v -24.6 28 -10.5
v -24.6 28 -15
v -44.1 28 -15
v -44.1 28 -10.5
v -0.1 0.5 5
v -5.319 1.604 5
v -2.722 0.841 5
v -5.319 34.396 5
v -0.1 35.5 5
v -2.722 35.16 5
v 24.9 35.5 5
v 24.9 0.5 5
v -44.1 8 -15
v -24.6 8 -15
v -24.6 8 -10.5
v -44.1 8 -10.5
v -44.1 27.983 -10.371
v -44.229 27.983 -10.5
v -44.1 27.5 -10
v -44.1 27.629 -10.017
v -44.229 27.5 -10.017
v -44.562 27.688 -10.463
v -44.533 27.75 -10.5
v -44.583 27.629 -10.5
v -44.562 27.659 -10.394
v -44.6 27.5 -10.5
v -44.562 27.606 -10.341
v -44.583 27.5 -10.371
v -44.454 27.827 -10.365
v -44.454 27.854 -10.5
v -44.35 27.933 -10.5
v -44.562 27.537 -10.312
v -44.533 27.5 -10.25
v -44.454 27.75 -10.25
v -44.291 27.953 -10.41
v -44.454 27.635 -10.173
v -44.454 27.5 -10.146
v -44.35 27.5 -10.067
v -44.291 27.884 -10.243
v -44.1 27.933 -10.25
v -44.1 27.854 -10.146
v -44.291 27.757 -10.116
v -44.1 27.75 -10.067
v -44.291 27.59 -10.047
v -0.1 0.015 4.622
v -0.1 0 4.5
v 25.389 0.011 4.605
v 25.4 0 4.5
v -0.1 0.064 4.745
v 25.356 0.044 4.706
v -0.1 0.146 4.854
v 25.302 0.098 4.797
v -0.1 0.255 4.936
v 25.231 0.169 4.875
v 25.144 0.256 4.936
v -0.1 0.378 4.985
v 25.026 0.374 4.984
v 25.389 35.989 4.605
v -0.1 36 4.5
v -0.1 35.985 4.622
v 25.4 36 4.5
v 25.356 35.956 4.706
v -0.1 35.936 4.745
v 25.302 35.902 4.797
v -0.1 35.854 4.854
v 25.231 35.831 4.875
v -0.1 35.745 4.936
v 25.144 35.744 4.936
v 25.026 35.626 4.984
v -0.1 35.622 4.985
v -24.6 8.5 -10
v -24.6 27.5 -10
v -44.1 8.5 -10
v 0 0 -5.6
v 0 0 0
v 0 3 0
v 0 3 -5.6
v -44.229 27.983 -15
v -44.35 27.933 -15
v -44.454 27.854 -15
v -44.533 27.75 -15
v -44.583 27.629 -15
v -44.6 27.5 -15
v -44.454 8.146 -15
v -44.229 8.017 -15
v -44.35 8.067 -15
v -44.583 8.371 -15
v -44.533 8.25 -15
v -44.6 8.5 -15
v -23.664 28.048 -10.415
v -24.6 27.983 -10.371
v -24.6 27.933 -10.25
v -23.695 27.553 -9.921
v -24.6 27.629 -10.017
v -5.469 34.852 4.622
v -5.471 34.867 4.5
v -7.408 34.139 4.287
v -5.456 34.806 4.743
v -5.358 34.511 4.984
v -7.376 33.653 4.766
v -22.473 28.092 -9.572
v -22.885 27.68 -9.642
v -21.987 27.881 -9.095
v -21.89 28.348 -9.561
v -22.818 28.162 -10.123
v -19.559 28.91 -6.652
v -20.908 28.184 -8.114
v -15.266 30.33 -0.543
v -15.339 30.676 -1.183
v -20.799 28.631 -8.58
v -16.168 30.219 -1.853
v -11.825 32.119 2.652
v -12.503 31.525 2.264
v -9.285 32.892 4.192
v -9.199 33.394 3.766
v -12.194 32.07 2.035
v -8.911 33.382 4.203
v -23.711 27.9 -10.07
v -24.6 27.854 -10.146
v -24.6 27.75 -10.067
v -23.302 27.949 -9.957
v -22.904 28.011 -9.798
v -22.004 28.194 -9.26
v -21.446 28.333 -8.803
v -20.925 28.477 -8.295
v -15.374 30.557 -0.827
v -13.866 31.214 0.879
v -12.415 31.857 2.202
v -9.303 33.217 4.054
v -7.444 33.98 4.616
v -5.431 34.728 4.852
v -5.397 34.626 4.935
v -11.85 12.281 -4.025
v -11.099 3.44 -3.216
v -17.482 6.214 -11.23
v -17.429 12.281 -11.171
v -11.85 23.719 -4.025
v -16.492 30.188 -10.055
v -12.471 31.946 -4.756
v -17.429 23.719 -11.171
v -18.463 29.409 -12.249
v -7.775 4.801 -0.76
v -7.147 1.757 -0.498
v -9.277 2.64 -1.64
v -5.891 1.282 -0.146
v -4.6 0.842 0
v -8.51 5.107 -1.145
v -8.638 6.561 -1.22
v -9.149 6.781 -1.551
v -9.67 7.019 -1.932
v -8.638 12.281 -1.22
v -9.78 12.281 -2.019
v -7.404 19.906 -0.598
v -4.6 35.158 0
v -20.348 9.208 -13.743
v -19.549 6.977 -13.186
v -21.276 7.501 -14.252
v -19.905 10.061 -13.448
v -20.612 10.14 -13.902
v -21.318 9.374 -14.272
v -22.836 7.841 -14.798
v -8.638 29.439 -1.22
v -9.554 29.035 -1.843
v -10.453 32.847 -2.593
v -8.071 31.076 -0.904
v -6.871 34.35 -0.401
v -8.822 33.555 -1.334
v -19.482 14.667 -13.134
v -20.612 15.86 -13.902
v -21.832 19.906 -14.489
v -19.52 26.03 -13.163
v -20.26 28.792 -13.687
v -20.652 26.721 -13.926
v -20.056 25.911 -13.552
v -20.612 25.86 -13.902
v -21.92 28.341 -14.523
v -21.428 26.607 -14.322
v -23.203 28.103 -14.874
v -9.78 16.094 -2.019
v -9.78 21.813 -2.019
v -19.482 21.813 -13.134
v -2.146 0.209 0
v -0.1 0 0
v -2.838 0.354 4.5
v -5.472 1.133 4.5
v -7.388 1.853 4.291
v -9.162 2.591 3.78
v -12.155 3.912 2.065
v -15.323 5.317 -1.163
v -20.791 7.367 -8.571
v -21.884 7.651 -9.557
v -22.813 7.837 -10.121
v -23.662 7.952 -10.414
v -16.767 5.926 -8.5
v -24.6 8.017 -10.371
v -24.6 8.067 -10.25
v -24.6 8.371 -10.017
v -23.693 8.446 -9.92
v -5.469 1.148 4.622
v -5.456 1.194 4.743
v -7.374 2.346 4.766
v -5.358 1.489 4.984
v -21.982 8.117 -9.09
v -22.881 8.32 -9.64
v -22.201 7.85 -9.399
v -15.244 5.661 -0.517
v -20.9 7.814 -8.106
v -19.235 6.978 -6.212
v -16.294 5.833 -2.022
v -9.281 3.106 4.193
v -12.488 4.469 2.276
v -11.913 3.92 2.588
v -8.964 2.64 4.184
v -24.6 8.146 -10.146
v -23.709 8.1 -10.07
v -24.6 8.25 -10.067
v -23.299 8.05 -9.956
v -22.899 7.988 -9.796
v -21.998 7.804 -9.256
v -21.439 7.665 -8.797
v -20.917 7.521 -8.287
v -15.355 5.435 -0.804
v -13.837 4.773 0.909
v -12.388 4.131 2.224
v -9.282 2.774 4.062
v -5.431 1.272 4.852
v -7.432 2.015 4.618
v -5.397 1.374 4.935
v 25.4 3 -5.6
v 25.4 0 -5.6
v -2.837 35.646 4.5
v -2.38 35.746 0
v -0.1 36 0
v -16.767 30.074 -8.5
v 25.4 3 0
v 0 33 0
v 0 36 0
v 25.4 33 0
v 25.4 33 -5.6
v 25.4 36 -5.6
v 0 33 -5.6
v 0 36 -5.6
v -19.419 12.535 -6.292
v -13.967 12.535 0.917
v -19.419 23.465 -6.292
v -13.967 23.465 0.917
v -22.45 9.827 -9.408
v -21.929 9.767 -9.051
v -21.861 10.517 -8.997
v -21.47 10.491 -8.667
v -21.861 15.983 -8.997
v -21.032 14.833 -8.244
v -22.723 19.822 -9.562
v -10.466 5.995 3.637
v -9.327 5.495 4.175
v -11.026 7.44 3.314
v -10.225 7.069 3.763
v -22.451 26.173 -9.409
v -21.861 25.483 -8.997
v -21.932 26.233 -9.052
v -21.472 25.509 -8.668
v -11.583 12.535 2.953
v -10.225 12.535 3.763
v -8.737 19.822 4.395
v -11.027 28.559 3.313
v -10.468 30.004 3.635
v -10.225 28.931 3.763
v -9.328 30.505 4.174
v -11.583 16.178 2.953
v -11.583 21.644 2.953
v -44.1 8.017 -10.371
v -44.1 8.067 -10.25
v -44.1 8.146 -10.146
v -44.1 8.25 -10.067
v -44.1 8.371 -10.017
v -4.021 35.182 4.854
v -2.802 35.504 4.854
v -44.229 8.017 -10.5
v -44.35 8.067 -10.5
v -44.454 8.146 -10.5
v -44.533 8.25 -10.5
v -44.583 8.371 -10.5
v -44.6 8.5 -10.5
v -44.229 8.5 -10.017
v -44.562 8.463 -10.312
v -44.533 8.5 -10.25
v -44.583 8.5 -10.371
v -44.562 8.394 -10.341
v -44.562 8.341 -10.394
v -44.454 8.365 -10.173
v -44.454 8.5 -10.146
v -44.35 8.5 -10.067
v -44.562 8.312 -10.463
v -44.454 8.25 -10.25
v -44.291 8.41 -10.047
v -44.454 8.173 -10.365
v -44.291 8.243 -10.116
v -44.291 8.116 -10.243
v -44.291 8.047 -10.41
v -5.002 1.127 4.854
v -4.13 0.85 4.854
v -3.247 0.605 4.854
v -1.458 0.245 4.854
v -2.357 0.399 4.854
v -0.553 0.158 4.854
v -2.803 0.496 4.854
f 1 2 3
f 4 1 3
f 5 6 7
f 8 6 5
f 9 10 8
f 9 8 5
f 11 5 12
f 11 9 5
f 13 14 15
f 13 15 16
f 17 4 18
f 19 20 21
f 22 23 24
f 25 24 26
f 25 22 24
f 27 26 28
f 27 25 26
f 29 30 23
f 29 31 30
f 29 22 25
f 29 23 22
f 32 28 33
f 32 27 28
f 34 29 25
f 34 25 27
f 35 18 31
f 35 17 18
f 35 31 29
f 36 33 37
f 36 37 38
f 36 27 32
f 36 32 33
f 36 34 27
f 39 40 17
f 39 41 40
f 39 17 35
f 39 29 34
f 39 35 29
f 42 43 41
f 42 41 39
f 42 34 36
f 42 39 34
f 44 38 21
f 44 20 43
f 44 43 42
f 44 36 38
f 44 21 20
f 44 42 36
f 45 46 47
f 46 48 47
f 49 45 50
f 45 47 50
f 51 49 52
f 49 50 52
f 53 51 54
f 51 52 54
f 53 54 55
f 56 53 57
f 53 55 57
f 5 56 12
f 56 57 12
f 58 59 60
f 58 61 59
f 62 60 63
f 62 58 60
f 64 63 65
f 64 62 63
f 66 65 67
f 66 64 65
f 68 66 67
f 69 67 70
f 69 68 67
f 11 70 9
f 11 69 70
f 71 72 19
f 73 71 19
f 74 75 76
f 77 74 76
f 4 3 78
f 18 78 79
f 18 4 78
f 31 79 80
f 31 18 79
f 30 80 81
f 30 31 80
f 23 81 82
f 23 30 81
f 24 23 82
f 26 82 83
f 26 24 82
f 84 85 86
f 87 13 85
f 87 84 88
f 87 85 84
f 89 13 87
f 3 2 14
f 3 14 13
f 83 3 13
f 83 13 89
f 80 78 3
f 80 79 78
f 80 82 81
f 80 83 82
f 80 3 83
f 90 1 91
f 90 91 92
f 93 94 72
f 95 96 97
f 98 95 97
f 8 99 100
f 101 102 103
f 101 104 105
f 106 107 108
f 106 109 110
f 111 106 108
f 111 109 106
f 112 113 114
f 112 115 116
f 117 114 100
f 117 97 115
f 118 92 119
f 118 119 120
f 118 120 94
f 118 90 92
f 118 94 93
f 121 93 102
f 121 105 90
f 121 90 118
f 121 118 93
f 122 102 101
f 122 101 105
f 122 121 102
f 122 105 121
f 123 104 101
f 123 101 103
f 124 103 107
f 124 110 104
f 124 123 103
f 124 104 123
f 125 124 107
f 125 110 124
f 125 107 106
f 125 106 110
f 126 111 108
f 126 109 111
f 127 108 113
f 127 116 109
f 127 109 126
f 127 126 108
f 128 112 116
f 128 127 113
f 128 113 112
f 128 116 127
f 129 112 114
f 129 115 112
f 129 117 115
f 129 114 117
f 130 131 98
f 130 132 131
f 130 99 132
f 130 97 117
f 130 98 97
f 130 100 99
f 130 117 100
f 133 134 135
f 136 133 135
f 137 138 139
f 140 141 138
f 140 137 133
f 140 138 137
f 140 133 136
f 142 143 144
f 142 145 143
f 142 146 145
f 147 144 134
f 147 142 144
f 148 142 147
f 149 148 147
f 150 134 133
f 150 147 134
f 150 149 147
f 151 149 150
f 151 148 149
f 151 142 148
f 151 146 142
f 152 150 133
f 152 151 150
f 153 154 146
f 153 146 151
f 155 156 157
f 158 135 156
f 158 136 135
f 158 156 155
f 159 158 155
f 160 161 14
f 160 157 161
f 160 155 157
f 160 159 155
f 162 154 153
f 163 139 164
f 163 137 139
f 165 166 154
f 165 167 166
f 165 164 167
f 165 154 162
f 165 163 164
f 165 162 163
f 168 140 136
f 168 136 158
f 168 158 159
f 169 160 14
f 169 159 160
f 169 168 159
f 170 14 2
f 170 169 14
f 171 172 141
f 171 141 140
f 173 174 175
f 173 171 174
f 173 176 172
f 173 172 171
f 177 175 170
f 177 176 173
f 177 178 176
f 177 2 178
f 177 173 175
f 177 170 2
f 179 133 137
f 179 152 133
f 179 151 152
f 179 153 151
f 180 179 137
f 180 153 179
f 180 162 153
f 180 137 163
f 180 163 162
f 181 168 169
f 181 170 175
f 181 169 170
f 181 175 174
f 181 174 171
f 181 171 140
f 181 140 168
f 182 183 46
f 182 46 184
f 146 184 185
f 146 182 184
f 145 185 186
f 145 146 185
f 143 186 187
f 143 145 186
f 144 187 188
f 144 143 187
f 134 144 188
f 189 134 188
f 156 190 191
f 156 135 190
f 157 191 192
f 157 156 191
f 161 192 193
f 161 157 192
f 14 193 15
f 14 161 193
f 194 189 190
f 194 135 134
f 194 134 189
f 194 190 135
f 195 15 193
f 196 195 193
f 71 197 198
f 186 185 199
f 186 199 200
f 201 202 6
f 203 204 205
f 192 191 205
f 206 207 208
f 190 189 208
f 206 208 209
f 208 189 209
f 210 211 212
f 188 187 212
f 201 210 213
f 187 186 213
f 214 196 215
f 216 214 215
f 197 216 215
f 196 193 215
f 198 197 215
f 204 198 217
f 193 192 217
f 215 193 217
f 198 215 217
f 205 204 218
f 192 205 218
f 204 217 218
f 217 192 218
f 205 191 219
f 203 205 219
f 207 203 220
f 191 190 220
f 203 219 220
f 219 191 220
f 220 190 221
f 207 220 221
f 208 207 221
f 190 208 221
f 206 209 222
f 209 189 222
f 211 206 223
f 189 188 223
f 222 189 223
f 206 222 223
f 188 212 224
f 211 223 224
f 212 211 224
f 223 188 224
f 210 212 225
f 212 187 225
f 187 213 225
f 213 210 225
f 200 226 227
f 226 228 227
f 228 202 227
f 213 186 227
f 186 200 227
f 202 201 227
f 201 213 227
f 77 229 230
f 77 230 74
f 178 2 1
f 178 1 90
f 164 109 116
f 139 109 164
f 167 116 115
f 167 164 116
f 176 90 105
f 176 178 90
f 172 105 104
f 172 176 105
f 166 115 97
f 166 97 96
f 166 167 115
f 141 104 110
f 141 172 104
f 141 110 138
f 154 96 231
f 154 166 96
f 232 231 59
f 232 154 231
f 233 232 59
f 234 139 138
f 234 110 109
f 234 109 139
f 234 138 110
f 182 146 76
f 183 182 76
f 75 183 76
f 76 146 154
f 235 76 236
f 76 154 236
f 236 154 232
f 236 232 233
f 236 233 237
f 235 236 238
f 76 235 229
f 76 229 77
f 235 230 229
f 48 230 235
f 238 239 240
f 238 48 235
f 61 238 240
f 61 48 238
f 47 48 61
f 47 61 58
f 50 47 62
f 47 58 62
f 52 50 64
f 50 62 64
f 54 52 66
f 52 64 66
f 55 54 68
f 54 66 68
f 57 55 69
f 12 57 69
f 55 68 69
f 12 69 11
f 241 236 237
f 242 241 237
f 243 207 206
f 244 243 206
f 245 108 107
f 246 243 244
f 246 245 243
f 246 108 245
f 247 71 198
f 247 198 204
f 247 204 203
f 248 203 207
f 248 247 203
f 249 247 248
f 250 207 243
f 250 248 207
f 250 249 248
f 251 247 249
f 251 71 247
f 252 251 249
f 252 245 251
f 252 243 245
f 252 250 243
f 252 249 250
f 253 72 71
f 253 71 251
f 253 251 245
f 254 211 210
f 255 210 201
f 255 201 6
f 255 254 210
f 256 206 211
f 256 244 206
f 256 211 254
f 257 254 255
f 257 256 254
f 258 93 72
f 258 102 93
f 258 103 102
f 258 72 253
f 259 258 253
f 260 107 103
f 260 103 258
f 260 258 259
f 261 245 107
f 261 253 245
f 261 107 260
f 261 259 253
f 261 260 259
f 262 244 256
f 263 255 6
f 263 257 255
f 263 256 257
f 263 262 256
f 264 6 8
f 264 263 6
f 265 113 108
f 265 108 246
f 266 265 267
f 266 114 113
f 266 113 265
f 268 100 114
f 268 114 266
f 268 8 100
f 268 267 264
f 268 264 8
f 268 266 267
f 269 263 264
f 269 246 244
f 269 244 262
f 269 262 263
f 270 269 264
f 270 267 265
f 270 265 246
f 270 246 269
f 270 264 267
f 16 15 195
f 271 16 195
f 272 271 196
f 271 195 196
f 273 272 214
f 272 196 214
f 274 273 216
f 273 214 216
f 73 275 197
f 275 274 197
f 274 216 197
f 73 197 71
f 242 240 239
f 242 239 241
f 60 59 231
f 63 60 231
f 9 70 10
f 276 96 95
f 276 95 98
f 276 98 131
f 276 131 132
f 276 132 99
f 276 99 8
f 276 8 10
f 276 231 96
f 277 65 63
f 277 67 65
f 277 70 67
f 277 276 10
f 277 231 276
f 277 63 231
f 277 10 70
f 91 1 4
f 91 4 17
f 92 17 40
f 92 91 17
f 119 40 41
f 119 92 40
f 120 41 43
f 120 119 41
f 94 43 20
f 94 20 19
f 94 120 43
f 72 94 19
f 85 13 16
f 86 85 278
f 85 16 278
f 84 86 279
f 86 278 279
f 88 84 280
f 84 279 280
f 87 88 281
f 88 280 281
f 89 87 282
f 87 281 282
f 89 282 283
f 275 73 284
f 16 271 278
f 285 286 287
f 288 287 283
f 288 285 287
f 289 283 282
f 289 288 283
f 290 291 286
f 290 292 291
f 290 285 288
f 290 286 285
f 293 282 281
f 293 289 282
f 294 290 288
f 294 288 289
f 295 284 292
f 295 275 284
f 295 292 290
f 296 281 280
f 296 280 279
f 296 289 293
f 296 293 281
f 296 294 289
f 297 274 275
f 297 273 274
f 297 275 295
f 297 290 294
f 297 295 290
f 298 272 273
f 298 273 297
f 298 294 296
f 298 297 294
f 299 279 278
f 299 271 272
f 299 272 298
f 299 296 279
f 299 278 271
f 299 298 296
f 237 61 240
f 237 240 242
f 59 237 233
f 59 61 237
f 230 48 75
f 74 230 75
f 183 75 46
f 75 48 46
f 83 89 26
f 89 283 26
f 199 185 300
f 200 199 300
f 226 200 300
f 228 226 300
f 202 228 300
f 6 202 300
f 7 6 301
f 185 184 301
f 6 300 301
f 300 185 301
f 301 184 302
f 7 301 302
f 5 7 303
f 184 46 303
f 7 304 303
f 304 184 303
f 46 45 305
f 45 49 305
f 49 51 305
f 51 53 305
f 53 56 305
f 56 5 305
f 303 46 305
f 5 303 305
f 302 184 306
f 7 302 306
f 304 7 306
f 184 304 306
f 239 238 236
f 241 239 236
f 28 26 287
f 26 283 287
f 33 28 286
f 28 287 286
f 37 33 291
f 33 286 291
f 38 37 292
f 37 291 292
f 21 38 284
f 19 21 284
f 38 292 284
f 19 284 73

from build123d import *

# Parameters (mm, degrees)
ESQUISSE1_W             = 44.6
ESQUISSE1_H             = 36
ESQUISSE1_W_2           = 25.4
BOSS_EXTRU_1_DEPTH      = 5
ESQUISSE2_W             = 25.4
ESQUISSE2_H             = 3
BOSS_EXTRU_2_DEPTH      = 5.6
ESQUISSE3_W             = 40
ESQUISSE3_H             = 36
BOSS_EXTRU_4_DEPTH      = 15
ENL_V_MAT_EXTRU_3_DEPTH = 60.246603278
ESQUISSE7_W             = 20
ESQUISSE7_H             = 8
ENL_V_MAT_EXTRU_4_DEPTH = 61.70551886
CONG_4_R                = 0.5


with BuildPart() as part:
    # Esquisse1 → Boss.-Extru.1 (new body)
    with BuildSketch(Plane.XY):
        with Locations((-22.3, 18)):
            Rectangle(ESQUISSE1_W, ESQUISSE1_H)
        with Locations((12.7, 18)):
            Rectangle(ESQUISSE1_W_2, ESQUISSE1_H)
    extrude(amount=BOSS_EXTRU_1_DEPTH)

    # Esquisse2 → Boss.-Extru.2 (add)
    with BuildSketch(Plane(origin=(0, 0, 0), x_dir=(-1, 0, 0), z_dir=(0, 0, -1))):
        with Locations((-12.7, 1.5)):
            Rectangle(ESQUISSE2_W, ESQUISSE2_H)
        with Locations((-12.7, 34.5)):
            Rectangle(ESQUISSE2_W, ESQUISSE2_H)
    extrude(amount=BOSS_EXTRU_2_DEPTH)

    # Esquisse3 → Boss.-Extru.4 (add)
    with BuildSketch(Plane(origin=(0, 0, 0), x_dir=(-1, 0, 0), z_dir=(0, 0, -1))):
        with Locations((24.6, 18)):
            Rectangle(ESQUISSE3_W, ESQUISSE3_H)
    extrude(amount=BOSS_EXTRU_4_DEPTH)

    # Esquisse4 → Enlèv. mat.-Extru.3 (cut, through all)
    with BuildSketch(Plane(origin=(0, 36, 0), x_dir=(1, 0, 0), z_dir=(0, 1, 0))):
        with BuildLine():
            Line((-24.6, 10), (-44.6, 10))
            Line((-44.6, 10), (-44.6, -5))
            Line((-44.6, -5), (-9.6, -5))
            Line((-9.6, -5), (-5.318745152, -5))
            add(Edge.make_bspline(
                [(-24.6, 10), (-18.581113582, 10.250438225), (-16.538607269, -4.688596284), (-5.318745152, -5)],
                knots=[0, 0, 0, 0, 0.979442109, 0.979442109, 0.979442109, 0.979442109], degree=3))
        make_face()
        with BuildLine():
            Line((-4.6, 15), (-24.6, 15))
            add(Edge.make_bspline(
                [(-4.6, 0), (-13.772339743, 0.318713019), (-15.546263661, 14.974819889), (-24.6, 15)],
                knots=[0, 0, 0, 0, 1, 1, 1, 1], degree=3))
            Line((-4.6, 0), (-4.6, 15))
        make_face()
    extrude(amount=-ENL_V_MAT_EXTRU_3_DEPTH, mode=Mode.SUBTRACT)

    # Esquisse7 → Enlèv. mat.-Extru.4 (cut, through all)
    with BuildSketch(Plane(origin=(0, 0, -15), x_dir=(-1, 0, 0), z_dir=(0, 0, -1))):
        with Locations((34.6, 4)):
            Rectangle(ESQUISSE7_W, ESQUISSE7_H)
        with BuildLine():
            Line((24.6, 0), (24.6, 8))
            add(Edge.make_bspline(
                [(0.1, 0), (6.766666667, 0), (17.933333333, 8), (24.6, 8)],
                knots=[0, 0, 0, 0, 1, 1, 1, 1], degree=3))
            Line((0.1, 0), (24.6, 0))
        make_face()
        with BuildLine():
            add(Edge.make_bspline(
                [(24.6, 28), (17.933333333, 28), (6.766666667, 36), (0.1, 36)],
                knots=[0, 0, 0, 0, 1, 1, 1, 1], degree=3))
            Line((24.6, 28), (24.6, 36))
            Line((24.6, 36), (0.1, 36))
        make_face()
        with Locations((34.6, 32)):
            Rectangle(ESQUISSE7_W, ESQUISSE7_H)
    extrude(amount=-ENL_V_MAT_EXTRU_4_DEPTH, mode=Mode.SUBTRACT)

    # Congé4
    cong_4_edges = [part.edges().sort_by_distance(p)[0] for p in [
        (-15.717570787, 30.513571579, -1.106703523),
        (-44.6, 28, -12.5),
        (-2.74987965, 35.666138518, 5),
        (12.65, 0, 5),
        (25.4, 18, 5),
        (12.65, 36, 5),
        (-44.6, 18, -10),
        (-34.6, 28, -10),
        (-34.6, 8, -10),
        (-15.717570798, 5.486428428, -1.10670351),
        (-44.6, 8, -12.5),
        (-2.749879652, 0.333861473, 5),
    ]]
    fillet(cong_4_edges, radius=CONG_4_R)


solid = part.part
